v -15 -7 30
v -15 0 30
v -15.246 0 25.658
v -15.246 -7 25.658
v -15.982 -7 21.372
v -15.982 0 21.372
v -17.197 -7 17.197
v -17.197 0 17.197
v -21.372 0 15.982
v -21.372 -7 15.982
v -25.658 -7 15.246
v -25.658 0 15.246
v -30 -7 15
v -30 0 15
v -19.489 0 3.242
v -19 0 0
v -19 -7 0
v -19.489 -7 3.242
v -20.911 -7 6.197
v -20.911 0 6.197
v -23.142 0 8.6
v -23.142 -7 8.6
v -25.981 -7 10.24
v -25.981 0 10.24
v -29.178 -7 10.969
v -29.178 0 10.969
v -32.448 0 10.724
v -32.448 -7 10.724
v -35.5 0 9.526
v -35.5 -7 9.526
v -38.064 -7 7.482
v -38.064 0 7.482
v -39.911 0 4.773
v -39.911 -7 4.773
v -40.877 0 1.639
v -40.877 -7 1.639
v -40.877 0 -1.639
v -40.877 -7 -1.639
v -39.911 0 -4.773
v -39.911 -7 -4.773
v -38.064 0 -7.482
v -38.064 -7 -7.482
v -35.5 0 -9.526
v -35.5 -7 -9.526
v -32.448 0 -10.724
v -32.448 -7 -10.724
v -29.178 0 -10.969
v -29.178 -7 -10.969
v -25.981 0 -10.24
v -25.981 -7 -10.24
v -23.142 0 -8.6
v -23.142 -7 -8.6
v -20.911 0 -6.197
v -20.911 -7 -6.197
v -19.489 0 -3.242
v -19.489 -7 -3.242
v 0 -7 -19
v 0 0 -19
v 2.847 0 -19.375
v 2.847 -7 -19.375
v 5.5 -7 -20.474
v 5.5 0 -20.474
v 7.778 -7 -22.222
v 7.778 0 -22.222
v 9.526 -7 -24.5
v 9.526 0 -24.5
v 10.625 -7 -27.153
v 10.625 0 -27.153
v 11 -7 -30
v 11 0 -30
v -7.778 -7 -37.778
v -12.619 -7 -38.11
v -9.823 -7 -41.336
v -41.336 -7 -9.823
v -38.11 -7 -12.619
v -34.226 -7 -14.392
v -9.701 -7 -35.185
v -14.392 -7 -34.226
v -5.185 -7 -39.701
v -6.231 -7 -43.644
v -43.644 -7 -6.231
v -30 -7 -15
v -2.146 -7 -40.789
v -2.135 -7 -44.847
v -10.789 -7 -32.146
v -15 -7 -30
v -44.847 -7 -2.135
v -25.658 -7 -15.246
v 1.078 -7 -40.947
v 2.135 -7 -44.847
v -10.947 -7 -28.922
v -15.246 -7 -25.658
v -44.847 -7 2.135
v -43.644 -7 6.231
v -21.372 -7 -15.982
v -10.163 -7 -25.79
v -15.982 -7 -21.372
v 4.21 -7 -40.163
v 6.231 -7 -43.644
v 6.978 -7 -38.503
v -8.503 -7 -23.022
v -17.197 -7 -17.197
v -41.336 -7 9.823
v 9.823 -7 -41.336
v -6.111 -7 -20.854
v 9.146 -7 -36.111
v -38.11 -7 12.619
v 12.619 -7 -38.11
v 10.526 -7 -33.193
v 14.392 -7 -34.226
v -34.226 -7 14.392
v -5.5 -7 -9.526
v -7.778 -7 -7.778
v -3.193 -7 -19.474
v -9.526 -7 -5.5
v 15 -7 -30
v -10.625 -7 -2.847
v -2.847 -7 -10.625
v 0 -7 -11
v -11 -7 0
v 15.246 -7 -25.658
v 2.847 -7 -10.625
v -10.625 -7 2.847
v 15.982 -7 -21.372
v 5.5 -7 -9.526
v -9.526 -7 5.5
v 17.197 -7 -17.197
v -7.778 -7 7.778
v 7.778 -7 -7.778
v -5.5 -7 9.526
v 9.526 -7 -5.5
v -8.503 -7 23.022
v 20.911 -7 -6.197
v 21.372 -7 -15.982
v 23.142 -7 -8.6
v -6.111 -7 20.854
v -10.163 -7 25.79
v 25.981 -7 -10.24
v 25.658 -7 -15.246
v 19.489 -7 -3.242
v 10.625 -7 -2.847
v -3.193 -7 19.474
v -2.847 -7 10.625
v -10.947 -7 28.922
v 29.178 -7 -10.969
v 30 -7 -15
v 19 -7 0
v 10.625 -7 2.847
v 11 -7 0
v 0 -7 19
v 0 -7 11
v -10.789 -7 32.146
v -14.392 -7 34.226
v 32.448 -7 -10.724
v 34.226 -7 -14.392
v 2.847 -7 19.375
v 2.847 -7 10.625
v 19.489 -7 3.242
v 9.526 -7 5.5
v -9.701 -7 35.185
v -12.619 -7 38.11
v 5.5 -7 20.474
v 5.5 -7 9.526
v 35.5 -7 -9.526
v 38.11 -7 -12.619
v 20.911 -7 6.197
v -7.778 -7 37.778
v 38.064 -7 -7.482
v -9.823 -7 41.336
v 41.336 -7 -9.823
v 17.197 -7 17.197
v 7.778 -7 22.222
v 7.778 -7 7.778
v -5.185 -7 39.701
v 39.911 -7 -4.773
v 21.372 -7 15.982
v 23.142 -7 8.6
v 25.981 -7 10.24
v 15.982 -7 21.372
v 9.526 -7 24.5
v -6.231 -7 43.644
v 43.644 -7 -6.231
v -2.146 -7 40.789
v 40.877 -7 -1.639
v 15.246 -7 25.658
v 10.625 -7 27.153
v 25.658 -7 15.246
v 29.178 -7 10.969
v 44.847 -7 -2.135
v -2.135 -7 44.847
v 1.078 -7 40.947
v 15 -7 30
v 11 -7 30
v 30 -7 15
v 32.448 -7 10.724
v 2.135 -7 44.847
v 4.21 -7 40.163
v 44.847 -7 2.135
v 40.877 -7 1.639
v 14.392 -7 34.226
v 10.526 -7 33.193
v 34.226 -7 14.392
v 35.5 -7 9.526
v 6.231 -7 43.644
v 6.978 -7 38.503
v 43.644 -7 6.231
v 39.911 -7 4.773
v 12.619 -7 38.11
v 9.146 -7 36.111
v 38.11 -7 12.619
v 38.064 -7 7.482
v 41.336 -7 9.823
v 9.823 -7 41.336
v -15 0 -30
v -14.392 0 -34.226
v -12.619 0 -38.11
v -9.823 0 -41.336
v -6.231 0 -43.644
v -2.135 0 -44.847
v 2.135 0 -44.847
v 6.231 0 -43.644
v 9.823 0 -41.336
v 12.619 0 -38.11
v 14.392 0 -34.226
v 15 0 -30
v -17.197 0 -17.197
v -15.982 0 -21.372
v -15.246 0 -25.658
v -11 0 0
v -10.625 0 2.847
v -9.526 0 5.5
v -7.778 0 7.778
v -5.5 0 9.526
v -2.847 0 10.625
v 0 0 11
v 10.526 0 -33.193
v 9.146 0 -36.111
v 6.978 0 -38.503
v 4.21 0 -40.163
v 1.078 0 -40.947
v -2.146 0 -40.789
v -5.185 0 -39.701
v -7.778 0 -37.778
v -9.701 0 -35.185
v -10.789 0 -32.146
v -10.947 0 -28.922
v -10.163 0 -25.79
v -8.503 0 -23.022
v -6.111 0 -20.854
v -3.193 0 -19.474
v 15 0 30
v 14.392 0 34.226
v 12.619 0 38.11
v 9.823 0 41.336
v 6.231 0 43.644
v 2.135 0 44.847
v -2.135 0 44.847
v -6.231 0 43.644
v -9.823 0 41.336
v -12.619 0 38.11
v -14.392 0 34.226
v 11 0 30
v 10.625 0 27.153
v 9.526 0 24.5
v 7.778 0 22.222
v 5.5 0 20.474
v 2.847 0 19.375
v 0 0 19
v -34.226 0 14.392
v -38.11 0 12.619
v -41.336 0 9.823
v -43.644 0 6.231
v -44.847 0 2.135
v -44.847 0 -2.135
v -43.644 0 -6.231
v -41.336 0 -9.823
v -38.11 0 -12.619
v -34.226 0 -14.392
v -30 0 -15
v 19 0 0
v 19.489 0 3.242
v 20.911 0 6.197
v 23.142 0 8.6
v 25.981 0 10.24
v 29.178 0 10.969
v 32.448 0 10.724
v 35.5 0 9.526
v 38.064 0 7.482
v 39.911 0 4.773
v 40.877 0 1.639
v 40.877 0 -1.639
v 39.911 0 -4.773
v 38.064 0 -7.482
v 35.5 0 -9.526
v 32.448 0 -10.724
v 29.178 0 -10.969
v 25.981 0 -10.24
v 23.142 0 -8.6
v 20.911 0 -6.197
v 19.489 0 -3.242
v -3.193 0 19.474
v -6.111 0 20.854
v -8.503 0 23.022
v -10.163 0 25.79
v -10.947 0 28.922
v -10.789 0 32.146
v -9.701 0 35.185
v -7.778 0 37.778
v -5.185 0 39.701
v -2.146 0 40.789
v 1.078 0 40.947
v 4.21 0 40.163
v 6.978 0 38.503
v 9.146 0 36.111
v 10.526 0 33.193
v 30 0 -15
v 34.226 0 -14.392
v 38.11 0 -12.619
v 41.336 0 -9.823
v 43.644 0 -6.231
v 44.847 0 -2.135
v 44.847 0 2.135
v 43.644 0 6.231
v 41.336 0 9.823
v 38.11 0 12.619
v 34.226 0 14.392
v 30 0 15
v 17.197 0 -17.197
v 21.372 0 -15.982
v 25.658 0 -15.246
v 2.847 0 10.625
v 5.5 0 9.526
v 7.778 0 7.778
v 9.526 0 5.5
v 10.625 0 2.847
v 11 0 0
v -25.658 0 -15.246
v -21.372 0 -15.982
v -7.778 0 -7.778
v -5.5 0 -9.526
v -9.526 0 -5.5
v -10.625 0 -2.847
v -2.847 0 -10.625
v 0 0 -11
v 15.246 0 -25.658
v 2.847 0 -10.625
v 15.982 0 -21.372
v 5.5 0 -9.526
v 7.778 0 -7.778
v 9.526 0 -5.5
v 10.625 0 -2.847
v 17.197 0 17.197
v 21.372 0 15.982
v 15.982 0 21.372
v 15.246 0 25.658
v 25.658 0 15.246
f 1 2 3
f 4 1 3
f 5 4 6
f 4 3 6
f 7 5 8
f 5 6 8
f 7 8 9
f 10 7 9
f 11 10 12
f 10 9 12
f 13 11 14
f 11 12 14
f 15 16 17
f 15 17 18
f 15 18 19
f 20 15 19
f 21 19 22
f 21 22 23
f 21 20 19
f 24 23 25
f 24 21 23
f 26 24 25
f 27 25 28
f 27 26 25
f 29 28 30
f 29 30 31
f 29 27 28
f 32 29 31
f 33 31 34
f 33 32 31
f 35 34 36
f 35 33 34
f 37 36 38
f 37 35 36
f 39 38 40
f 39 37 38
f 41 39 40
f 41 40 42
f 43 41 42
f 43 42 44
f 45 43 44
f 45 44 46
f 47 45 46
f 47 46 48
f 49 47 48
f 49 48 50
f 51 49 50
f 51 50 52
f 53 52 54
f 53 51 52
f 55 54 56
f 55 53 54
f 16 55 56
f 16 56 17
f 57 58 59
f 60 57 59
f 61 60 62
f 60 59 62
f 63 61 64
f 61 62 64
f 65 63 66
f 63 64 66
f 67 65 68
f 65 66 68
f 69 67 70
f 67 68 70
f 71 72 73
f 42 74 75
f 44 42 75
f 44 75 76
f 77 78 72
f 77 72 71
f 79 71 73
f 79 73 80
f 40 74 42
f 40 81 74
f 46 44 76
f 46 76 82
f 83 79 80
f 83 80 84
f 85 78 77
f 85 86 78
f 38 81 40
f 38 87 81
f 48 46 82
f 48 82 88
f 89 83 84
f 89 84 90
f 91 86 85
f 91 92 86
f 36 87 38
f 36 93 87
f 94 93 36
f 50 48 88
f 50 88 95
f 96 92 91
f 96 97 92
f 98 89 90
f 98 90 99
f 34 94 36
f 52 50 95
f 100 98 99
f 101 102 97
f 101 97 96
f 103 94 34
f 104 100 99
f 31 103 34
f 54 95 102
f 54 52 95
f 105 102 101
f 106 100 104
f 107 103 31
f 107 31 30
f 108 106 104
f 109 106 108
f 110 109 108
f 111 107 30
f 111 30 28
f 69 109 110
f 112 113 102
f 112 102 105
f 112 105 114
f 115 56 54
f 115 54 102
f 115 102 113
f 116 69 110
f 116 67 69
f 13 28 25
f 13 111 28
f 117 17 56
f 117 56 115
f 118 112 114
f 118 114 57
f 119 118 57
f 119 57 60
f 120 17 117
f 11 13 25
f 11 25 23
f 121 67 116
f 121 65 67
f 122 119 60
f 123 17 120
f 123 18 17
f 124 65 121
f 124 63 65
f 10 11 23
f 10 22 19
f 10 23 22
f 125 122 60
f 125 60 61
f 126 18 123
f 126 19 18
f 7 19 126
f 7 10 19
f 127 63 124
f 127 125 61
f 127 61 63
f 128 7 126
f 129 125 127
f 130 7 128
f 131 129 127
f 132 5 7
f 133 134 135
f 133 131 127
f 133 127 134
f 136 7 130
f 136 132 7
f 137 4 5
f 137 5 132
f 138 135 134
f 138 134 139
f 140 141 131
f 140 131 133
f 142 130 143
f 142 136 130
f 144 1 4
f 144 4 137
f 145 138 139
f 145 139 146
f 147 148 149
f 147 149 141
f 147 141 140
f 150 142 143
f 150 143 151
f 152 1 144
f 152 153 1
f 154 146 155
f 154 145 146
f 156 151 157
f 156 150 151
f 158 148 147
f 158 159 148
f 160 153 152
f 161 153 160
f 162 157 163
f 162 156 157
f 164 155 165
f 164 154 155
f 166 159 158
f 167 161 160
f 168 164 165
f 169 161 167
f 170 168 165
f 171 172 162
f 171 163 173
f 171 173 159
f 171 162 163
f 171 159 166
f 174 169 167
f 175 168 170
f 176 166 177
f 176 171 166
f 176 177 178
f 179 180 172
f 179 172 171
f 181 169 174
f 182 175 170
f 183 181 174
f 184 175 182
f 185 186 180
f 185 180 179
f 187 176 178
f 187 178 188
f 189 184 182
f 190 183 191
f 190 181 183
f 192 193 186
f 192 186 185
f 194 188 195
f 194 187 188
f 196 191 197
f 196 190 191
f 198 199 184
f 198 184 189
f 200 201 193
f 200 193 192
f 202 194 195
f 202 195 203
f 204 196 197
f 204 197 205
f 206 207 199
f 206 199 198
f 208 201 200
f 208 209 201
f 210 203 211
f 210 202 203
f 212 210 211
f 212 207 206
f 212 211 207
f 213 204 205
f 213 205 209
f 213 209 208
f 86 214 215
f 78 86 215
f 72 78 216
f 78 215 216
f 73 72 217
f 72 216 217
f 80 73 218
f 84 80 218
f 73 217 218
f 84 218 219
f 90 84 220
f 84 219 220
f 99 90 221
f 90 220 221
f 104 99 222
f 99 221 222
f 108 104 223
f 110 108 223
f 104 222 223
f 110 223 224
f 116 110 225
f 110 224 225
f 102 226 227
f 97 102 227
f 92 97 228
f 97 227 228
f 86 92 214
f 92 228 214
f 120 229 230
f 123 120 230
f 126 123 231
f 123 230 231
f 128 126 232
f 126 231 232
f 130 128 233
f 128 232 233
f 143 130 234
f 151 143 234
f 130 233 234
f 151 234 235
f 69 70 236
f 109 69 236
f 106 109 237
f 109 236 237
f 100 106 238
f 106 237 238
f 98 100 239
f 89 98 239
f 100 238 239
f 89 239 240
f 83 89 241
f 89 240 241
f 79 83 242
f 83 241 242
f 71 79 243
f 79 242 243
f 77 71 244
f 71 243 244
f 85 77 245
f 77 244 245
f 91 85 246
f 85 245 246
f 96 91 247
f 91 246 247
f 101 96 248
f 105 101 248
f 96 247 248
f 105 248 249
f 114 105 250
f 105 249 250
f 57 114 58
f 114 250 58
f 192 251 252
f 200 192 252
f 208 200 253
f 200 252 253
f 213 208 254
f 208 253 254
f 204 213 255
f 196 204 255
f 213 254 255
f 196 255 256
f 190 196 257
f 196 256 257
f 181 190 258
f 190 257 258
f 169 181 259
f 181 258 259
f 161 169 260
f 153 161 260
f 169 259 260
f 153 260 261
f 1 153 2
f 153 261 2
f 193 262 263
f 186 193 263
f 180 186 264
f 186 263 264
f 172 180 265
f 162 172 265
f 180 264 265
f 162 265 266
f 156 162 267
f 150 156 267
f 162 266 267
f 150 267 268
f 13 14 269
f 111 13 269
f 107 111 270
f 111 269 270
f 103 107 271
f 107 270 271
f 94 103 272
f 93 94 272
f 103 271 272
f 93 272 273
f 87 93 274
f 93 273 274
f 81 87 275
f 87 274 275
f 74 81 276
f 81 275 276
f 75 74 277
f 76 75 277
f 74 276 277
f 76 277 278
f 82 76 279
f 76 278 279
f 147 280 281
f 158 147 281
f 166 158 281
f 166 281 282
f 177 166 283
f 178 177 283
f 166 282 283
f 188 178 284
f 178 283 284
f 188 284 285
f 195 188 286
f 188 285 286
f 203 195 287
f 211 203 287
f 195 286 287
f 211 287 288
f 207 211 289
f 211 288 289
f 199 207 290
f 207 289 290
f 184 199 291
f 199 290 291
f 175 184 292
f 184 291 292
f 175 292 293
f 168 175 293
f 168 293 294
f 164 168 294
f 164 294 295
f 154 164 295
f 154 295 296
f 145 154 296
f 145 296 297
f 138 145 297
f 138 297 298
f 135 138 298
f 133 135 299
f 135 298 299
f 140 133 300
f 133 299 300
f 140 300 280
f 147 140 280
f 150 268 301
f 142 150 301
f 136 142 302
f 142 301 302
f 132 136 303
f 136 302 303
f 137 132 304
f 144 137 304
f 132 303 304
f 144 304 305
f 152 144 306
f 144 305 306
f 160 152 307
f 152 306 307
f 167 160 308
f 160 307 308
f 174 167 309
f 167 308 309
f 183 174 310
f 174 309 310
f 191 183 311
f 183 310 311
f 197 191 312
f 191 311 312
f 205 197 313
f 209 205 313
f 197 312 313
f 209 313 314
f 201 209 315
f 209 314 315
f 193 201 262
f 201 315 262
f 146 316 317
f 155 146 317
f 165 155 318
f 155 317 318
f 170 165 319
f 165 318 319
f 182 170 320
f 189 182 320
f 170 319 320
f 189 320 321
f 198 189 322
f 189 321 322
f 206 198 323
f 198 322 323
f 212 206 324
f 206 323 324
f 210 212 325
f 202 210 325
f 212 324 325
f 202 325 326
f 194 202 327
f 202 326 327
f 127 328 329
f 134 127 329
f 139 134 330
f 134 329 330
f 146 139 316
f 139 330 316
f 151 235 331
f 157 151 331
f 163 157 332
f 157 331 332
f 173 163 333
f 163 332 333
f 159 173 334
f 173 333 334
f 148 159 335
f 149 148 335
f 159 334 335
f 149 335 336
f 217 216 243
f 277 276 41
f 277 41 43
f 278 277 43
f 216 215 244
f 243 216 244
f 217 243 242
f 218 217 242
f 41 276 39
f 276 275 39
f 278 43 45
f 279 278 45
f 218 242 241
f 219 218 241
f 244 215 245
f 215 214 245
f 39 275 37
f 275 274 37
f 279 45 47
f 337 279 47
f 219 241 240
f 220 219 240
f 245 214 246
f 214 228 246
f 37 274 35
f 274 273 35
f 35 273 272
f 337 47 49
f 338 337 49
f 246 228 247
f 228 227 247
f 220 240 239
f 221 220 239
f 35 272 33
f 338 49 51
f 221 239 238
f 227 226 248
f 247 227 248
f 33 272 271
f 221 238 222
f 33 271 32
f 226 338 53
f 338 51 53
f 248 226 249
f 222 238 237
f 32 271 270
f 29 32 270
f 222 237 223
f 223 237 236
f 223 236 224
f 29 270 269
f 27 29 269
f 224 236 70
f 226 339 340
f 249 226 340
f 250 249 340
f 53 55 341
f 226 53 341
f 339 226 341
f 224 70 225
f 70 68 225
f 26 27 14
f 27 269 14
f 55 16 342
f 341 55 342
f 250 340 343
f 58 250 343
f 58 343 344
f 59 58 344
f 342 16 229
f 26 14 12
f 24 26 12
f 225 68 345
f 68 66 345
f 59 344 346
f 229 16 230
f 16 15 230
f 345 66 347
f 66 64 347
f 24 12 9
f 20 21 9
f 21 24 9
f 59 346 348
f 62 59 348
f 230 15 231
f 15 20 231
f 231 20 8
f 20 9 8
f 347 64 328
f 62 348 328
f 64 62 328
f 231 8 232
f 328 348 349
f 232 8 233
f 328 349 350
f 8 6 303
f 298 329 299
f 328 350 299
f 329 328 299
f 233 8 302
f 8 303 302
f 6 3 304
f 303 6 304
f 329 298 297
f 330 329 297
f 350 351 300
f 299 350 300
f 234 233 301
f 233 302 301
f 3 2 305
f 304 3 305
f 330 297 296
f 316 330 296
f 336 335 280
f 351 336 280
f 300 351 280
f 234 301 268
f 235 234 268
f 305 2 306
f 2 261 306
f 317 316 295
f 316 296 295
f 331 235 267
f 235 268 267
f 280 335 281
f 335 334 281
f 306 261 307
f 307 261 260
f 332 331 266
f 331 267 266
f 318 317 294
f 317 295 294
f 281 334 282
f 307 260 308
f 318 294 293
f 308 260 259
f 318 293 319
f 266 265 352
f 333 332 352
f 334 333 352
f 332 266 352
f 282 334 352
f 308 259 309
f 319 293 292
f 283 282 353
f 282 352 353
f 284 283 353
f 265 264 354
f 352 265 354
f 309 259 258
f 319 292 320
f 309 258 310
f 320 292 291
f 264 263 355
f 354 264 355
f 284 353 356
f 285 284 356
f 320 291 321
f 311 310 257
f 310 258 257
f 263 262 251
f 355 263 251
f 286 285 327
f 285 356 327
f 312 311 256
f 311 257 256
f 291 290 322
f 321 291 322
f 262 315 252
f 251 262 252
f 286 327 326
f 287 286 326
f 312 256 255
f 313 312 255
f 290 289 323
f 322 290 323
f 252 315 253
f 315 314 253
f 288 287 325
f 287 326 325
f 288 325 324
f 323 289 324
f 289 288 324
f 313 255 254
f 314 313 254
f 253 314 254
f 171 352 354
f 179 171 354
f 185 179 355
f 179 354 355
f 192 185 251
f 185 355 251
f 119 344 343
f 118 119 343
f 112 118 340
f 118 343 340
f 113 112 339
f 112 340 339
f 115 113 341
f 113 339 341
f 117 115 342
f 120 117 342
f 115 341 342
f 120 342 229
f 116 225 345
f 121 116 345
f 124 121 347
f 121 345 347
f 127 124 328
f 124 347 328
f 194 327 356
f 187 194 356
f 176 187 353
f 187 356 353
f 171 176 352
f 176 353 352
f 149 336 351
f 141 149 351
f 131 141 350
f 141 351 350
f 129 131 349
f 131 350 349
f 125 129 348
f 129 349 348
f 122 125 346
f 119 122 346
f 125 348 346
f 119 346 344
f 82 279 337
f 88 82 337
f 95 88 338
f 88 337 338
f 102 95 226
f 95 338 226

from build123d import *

# Parameters (mm, degrees)
F0_R     = 11
F1_DEPTH = 7


with BuildPart() as f1:
    # F0 (on Front) → F1 (new body)
    with BuildSketch(Plane.XZ):
        with BuildLine():
            ThreePointArc((30, -15), (45, 0), (30, 15))
            ThreePointArc((30, 15), (23.504809, 15.553158), (17.196699, 17.196699))
            ThreePointArc((17.196699, 17.196699), (15.553158, 23.504809), (15, 30))
            ThreePointArc((15, 30), (0, 45), (-15, 30))
            ThreePointArc((-15, 30), (-15.553158, 23.504809), (-17.196699, 17.196699))
            ThreePointArc((-17.196699, 17.196699), (-23.504809, 15.553158), (-30, 15))
            ThreePointArc((-30, 15), (-45, 0), (-30, -15))
            ThreePointArc((-30, -15), (-23.504809, -15.553158), (-17.196699, -17.196699))
            ThreePointArc((-17.196699, -17.196699), (-15.553158, -23.504809), (-15, -30))
            ThreePointArc((-15, -30), (0, -45), (15, -30))
            ThreePointArc((15, -30), (15.553158, -23.504809), (17.196699, -17.196699))
            ThreePointArc((17.196699, -17.196699), (23.504809, -15.553158), (30, -15))
        make_face()
        with BuildLine():
            ThreePointArc((11, -30), (-7.778175, -37.778175), (0, -19))
            ThreePointArc((0, -19), (7.778175, -22.221825), (11, -30))
        make_face(mode=Mode.SUBTRACT)
        with Locations((-30, 0)):
            Circle(F0_R, mode=Mode.SUBTRACT)
        with BuildLine():
            ThreePointArc((11, 0), (7.778175, -7.778175), (0, -11))
            ThreePointArc((0, -11), (-7.778175, -7.778175), (-11, 0))
            ThreePointArc((-11, 0), (-7.778175, 7.778175), (0, 11))
            ThreePointArc((0, 11), (7.778175, 7.778175), (11, 0))
        make_face(mode=Mode.SUBTRACT)
        with BuildLine():
            ThreePointArc((41, 0), (30, -11), (19, 0))
            ThreePointArc((19, 0), (30, 11), (41, 0))
        make_face(mode=Mode.SUBTRACT)
        with BuildLine():
            ThreePointArc((11, 30), (7.778175, 22.221825), (0, 19))
            ThreePointArc((0, 19), (-7.778175, 37.778175), (11, 30))
        make_face(mode=Mode.SUBTRACT)
    extrude(amount=F1_DEPTH)


solid = f1.part
